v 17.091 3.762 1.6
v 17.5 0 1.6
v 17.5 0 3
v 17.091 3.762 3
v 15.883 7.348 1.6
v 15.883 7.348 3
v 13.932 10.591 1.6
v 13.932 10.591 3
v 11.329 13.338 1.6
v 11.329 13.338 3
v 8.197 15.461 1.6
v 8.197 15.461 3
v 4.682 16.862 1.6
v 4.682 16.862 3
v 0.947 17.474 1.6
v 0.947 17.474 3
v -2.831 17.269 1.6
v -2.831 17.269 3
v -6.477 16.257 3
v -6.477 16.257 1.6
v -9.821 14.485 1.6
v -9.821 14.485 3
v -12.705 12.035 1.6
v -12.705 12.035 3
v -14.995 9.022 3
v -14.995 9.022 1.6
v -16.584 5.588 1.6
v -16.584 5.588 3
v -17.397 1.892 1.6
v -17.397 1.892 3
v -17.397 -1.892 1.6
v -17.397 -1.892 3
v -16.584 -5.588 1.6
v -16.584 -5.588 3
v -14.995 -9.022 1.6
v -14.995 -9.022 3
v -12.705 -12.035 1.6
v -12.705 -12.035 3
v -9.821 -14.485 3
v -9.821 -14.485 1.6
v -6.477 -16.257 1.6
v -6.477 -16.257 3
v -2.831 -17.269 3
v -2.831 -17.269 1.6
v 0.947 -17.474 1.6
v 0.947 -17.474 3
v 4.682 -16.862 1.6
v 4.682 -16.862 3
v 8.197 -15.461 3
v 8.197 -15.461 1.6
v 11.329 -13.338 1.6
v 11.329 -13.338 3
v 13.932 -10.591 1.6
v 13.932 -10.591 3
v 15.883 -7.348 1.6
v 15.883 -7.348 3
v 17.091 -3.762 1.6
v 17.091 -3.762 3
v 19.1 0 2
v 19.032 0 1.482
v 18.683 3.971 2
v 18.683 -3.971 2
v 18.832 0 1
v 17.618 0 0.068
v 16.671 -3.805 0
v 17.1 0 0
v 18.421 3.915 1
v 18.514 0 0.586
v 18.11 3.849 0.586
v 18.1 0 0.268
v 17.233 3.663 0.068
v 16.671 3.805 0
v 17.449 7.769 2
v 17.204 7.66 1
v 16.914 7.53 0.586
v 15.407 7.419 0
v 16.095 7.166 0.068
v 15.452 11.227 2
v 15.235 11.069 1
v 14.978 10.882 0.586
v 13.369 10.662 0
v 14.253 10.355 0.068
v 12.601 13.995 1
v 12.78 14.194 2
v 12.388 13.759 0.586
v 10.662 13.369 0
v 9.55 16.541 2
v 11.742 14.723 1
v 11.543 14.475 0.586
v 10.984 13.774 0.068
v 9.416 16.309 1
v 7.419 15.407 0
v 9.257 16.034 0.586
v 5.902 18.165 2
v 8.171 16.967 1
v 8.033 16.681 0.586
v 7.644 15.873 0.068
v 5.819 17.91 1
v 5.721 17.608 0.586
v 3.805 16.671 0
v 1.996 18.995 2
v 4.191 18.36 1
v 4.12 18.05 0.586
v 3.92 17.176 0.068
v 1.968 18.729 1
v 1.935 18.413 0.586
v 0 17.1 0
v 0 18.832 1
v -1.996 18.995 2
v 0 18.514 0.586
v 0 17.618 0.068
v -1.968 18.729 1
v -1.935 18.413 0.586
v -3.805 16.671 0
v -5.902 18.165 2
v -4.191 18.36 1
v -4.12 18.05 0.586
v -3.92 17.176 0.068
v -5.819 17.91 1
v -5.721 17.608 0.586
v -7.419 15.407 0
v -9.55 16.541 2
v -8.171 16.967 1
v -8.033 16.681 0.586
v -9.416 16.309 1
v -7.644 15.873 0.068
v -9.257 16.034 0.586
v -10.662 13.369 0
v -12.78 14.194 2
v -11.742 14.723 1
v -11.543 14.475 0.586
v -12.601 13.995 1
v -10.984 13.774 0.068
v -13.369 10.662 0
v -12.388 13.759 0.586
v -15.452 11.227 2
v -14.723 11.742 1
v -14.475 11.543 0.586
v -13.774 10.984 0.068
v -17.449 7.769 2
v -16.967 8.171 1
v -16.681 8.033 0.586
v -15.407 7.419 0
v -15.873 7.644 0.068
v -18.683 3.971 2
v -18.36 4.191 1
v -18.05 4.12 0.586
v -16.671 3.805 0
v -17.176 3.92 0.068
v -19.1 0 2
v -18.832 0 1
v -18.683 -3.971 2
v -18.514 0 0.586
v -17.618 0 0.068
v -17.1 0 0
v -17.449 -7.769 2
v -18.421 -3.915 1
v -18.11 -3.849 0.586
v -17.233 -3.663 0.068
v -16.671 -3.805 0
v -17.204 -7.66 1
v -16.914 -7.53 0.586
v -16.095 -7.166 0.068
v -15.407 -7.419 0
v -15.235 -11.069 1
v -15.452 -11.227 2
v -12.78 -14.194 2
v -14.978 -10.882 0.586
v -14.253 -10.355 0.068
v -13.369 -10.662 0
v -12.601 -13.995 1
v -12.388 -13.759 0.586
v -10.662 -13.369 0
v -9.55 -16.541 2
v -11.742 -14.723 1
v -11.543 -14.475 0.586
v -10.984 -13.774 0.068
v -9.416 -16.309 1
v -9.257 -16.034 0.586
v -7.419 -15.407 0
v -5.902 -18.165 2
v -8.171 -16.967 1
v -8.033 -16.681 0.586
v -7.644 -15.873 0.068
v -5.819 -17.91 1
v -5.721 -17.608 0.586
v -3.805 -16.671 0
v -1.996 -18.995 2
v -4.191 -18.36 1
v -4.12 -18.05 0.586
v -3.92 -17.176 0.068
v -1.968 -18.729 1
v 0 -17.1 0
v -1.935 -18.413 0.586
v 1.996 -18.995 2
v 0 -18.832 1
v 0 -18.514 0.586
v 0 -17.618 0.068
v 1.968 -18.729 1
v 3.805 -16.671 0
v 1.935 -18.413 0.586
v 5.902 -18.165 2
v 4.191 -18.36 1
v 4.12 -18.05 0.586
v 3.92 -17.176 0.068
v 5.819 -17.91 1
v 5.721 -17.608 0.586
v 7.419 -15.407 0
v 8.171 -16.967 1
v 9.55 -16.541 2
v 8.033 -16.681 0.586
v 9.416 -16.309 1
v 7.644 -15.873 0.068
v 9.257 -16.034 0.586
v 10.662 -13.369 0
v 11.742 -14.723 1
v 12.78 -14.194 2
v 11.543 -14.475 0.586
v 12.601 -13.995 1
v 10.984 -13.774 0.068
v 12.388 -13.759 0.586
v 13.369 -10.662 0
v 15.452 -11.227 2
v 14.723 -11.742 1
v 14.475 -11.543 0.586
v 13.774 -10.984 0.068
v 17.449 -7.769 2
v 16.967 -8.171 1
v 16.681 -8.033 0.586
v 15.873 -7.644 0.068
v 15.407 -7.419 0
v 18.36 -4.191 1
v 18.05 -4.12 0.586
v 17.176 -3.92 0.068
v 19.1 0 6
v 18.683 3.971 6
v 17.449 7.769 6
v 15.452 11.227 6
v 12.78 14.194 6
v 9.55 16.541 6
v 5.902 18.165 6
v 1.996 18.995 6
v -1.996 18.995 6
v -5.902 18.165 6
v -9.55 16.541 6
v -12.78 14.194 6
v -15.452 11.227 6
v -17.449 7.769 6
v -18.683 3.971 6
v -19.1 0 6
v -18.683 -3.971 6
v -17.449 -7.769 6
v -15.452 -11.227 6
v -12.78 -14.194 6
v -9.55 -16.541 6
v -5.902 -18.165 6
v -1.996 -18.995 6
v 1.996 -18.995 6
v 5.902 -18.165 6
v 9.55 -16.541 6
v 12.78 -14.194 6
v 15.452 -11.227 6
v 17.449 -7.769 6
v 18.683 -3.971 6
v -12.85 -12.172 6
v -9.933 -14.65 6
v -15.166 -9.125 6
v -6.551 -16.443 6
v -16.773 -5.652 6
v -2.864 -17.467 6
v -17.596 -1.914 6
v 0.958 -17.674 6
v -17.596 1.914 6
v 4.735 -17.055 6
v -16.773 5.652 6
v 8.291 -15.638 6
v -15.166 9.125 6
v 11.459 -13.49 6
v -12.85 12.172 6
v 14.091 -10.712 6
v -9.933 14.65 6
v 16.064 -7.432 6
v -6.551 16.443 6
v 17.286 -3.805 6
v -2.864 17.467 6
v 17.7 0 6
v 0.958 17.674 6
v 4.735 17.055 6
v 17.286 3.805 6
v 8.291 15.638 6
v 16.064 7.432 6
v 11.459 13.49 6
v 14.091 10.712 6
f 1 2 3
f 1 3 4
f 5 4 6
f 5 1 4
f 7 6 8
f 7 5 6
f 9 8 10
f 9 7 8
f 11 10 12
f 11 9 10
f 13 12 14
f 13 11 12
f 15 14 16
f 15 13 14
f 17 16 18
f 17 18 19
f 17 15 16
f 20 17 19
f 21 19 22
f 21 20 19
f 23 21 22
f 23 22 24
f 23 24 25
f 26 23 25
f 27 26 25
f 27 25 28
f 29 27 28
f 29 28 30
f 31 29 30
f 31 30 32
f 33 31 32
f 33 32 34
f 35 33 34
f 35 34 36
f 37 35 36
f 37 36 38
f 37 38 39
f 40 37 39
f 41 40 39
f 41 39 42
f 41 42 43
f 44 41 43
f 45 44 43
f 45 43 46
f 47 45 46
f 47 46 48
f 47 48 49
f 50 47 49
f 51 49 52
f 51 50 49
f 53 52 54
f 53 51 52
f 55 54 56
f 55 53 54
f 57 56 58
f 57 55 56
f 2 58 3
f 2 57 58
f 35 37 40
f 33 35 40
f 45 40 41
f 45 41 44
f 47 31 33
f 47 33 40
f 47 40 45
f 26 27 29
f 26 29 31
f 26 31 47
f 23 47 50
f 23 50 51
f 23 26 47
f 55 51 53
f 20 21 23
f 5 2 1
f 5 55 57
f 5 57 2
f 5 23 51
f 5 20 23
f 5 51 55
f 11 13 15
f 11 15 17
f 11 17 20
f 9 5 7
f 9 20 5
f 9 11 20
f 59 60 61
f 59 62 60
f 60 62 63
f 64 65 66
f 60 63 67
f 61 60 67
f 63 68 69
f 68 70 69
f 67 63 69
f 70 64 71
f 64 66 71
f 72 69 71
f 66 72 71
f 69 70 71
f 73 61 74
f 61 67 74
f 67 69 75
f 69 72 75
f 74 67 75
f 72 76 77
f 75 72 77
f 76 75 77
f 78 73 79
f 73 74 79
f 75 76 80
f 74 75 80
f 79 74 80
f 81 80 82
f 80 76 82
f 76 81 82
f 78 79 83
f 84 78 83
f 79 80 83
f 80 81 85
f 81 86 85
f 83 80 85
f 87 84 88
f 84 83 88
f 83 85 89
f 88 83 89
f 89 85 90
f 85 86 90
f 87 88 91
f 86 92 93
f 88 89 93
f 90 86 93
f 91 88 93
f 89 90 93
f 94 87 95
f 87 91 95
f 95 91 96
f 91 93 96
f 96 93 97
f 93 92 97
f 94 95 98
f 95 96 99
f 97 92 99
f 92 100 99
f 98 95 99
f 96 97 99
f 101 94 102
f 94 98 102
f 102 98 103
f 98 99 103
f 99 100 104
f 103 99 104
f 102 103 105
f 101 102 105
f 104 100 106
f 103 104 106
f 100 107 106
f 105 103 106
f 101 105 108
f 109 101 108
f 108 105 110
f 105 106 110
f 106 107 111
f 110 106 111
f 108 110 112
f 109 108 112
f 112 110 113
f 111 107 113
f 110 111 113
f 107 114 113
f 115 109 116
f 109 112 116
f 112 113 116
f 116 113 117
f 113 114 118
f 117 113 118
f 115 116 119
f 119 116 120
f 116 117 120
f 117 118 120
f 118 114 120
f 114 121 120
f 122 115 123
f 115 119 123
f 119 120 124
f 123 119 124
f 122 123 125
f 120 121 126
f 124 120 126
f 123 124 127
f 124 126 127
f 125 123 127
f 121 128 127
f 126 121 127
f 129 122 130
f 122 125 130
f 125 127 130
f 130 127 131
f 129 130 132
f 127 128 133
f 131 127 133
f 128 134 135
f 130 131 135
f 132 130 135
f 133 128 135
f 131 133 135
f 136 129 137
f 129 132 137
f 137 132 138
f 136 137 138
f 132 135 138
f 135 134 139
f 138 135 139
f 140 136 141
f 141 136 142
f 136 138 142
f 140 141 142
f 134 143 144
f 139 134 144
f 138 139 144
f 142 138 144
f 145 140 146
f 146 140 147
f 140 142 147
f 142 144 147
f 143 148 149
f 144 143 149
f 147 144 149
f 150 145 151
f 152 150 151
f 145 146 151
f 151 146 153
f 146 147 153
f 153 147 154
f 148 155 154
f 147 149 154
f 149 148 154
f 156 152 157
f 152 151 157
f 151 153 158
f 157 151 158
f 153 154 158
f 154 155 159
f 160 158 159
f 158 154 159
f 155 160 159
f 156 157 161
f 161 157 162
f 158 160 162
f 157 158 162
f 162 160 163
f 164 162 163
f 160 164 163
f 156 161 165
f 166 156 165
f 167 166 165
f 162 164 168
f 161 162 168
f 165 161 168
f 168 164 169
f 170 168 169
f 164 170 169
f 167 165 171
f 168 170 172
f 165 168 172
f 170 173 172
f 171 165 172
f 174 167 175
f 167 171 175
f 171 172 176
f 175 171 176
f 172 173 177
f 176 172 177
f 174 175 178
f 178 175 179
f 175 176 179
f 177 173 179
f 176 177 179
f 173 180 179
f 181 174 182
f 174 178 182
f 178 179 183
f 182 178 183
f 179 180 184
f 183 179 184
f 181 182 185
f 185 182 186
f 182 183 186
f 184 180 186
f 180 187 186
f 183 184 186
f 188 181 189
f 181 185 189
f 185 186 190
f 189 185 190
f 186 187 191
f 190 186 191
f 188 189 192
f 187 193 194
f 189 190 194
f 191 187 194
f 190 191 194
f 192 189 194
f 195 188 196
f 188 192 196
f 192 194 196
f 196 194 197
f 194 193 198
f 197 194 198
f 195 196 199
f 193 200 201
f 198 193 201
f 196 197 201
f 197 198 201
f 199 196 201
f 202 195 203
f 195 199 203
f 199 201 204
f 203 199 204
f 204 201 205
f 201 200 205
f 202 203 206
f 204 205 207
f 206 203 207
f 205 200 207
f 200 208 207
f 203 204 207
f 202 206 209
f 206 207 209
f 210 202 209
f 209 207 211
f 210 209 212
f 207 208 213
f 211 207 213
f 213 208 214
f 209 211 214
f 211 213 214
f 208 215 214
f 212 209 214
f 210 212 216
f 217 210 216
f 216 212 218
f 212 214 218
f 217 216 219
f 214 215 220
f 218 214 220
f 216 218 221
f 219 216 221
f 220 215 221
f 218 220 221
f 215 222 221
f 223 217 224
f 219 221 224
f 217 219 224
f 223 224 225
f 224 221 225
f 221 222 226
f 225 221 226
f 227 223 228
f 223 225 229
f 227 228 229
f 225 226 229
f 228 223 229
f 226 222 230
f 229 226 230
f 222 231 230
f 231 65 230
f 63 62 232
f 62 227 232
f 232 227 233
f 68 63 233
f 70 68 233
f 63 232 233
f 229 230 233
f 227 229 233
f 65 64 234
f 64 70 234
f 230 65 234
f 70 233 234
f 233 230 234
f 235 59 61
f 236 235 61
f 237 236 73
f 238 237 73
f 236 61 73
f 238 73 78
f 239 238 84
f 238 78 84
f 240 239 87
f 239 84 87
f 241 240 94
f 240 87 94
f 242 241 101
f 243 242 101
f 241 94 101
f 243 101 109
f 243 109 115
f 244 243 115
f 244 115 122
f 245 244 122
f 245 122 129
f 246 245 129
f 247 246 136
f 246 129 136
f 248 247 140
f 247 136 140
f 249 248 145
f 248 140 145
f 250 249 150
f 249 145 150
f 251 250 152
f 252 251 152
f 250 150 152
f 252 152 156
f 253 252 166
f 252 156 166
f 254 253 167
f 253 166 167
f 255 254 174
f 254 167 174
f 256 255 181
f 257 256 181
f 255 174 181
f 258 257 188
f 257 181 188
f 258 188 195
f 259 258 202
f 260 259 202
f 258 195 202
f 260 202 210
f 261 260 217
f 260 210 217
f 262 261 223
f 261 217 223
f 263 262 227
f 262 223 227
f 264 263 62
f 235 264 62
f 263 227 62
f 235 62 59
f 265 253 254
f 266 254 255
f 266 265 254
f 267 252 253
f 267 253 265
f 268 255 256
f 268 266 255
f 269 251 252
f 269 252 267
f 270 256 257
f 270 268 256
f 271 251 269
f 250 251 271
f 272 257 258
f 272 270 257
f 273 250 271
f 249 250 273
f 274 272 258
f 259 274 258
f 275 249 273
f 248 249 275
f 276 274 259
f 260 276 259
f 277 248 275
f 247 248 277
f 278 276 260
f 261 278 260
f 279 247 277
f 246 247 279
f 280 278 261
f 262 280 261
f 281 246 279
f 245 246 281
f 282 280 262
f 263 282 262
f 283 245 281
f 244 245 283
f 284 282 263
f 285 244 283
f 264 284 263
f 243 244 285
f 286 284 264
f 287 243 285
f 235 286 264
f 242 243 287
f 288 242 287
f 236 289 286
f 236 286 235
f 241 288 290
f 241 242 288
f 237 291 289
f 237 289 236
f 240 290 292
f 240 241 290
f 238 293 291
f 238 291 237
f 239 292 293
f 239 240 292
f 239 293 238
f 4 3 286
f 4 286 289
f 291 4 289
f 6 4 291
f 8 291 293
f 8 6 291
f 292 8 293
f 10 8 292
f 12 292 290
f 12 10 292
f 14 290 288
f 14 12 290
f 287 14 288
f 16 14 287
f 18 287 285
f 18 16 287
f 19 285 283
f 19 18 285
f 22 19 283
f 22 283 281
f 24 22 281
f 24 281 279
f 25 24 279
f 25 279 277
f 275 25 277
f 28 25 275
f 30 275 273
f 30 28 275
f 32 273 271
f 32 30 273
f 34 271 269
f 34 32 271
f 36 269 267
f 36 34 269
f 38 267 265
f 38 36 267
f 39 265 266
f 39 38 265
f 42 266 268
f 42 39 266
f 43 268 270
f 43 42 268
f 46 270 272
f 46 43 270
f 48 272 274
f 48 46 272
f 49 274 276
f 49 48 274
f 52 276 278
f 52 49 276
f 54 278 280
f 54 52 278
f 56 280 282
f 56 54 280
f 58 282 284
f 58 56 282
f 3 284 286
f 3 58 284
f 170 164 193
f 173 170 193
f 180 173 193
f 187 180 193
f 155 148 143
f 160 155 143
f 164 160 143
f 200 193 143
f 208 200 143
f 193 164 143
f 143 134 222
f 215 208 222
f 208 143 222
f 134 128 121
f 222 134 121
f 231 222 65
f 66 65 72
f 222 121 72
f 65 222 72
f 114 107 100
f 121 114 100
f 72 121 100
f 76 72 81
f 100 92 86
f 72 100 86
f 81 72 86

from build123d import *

# Parameters (mm, degrees)
F0_R     = 17.5
F1_DEPTH = 1.6
F0_R_2   = 19.1
F2_DEPTH = 6
F3_SIZE2 = 3
F3_SIZE  = 0.2
F4_R     = 2


with BuildPart() as f1:
    # F0 (on Top) → F1 (new body)
    with BuildSketch(Plane.XY):
        Circle(F0_R)
    extrude(amount=F1_DEPTH)

    # F0 (on Top) → F2 (join)
    with BuildSketch(Plane.XY):
        Circle(F0_R_2)
        Circle(F0_R, mode=Mode.SUBTRACT)
    extrude(amount=F2_DEPTH)

    # F3
    f3_edges = [f1.edges().sort_by_distance(p)[0] for p in [
        (-17.5, 0, 6),
    ]]
    chamfer(f3_edges, length=F3_SIZE, length2=F3_SIZE2)

    # F4
    f4_edges = [f1.edges().sort_by_distance(p)[0] for p in [
        (-19.1, 0, 0),
    ]]
    fillet(f4_edges, radius=F4_R)


solid = f1.part
